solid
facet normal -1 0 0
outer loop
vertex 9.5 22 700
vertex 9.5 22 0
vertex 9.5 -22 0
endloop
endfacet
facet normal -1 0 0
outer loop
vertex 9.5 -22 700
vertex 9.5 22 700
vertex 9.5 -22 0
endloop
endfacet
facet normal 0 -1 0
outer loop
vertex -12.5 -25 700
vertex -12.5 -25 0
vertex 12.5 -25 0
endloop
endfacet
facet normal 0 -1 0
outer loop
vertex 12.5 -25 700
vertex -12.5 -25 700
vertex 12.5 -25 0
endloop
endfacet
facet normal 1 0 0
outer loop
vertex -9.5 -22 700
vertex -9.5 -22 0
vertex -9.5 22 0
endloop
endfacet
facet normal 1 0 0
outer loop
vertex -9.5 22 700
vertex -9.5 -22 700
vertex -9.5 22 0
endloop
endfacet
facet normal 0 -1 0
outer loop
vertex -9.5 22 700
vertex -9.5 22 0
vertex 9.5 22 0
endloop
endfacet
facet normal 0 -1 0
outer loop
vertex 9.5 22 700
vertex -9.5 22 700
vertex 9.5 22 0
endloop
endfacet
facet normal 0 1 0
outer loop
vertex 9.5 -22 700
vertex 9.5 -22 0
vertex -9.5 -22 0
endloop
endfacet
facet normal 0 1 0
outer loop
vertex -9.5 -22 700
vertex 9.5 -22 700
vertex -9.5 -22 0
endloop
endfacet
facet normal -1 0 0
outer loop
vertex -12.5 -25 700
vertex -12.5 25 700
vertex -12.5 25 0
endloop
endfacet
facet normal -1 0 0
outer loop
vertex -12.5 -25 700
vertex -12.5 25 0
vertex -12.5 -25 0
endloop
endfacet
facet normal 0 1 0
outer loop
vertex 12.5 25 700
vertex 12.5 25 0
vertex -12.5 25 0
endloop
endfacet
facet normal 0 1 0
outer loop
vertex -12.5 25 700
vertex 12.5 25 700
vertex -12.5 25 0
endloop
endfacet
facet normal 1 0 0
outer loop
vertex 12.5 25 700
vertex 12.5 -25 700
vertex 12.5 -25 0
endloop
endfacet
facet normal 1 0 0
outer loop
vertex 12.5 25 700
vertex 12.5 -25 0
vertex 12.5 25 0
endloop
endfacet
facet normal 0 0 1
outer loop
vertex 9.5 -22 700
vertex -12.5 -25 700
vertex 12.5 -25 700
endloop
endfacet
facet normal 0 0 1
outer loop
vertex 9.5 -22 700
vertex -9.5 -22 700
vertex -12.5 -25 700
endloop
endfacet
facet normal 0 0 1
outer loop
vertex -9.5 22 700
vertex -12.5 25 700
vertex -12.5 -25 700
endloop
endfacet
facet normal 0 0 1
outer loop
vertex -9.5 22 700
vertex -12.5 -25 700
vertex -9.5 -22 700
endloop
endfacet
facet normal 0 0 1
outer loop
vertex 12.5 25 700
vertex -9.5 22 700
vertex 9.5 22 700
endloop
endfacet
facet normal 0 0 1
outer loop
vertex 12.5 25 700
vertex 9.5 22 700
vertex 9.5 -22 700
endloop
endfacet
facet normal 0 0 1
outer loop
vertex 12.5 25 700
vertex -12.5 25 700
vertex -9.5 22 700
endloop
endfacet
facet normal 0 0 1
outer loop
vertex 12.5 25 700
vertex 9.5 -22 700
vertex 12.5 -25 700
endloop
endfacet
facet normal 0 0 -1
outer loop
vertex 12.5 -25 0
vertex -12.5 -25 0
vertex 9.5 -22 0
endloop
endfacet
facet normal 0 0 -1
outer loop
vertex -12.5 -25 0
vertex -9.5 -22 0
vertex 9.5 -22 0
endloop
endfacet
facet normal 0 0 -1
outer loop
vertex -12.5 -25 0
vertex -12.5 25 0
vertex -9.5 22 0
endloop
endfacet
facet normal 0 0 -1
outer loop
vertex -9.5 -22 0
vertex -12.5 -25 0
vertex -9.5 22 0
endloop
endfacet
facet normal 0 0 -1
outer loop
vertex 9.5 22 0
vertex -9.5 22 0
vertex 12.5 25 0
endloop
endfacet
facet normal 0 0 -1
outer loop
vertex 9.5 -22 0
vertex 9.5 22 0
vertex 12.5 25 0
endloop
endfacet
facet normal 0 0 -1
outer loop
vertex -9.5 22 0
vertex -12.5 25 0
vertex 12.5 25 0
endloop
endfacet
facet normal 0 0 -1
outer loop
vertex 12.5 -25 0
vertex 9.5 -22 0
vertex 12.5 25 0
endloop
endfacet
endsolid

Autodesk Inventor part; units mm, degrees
ref_plane "YZ Plane" through (0, 0, 0) normal (1, 0, 0) x (0, 1, 0)
ref_plane "Start Plane" through (0, 0, 0) normal (0, 0, 1) x (1, 0, 0)
ref_plane "End Plane" through (0, 0, 700) normal (0, 0, 1) x (1, 0, 0)
sketch "Sketch" plane through (0, 0, 0) normal (0, 0, 1) x (1, 0, 0)
  line L0 (-12.5, -25) -> (12.5, -25)
  line L1 (12.5, -25) -> (12.5, 25)
  line L2 (12.5, 25) -> (-12.5, 25)
  line L3 (-12.5, 25) -> (-12.5, -25)
  line L4 (-12.5, -25) -> (12.5, 25) construction
  line L5 (12.5, -25) -> (-12.5, 25) construction
  line L6 (-9.5, 22) -> (9.5, 22)
  line L7 (9.5, 22) -> (9.5, -22)
  line L8 (9.5, -22) -> (-9.5, -22)
  line L9 (-9.5, -22) -> (-9.5, 22)
  point P0 (0, 0)
  dimension "Width" = 25
  dimension "Height" = 50
  dimension "Thickness" = 3
extrude "Body" add sketch "Sketch" along normal up to surface (700 mm away) from surface at 0
sketch "Sketch2" plane through (0, 0, 0) normal (0, 0, 1) x (1, 0, 0)
  line L0 (0, 0) -> (10, 0)
ref_plane "Work Plane3" through (0, 0, 0) normal (0, -1, 0) x (1, 0, 0)
sketch "Sketch3" plane through (0, 0, 0) normal (0, -1, 0) x (1, 0, 0)
  line L0 (-2, 0) -> (12, 0)
  line L1 (-2, 700) -> (12, 700)
  dimension "d10" = 700
equation "\"G_OFFSET_START\" = 0"
equation "\"G_OFFSET_END\" = 0"
equation "\"G_L\" = 100"
properties part number "25x50x3" material "Aluminum 6061"
